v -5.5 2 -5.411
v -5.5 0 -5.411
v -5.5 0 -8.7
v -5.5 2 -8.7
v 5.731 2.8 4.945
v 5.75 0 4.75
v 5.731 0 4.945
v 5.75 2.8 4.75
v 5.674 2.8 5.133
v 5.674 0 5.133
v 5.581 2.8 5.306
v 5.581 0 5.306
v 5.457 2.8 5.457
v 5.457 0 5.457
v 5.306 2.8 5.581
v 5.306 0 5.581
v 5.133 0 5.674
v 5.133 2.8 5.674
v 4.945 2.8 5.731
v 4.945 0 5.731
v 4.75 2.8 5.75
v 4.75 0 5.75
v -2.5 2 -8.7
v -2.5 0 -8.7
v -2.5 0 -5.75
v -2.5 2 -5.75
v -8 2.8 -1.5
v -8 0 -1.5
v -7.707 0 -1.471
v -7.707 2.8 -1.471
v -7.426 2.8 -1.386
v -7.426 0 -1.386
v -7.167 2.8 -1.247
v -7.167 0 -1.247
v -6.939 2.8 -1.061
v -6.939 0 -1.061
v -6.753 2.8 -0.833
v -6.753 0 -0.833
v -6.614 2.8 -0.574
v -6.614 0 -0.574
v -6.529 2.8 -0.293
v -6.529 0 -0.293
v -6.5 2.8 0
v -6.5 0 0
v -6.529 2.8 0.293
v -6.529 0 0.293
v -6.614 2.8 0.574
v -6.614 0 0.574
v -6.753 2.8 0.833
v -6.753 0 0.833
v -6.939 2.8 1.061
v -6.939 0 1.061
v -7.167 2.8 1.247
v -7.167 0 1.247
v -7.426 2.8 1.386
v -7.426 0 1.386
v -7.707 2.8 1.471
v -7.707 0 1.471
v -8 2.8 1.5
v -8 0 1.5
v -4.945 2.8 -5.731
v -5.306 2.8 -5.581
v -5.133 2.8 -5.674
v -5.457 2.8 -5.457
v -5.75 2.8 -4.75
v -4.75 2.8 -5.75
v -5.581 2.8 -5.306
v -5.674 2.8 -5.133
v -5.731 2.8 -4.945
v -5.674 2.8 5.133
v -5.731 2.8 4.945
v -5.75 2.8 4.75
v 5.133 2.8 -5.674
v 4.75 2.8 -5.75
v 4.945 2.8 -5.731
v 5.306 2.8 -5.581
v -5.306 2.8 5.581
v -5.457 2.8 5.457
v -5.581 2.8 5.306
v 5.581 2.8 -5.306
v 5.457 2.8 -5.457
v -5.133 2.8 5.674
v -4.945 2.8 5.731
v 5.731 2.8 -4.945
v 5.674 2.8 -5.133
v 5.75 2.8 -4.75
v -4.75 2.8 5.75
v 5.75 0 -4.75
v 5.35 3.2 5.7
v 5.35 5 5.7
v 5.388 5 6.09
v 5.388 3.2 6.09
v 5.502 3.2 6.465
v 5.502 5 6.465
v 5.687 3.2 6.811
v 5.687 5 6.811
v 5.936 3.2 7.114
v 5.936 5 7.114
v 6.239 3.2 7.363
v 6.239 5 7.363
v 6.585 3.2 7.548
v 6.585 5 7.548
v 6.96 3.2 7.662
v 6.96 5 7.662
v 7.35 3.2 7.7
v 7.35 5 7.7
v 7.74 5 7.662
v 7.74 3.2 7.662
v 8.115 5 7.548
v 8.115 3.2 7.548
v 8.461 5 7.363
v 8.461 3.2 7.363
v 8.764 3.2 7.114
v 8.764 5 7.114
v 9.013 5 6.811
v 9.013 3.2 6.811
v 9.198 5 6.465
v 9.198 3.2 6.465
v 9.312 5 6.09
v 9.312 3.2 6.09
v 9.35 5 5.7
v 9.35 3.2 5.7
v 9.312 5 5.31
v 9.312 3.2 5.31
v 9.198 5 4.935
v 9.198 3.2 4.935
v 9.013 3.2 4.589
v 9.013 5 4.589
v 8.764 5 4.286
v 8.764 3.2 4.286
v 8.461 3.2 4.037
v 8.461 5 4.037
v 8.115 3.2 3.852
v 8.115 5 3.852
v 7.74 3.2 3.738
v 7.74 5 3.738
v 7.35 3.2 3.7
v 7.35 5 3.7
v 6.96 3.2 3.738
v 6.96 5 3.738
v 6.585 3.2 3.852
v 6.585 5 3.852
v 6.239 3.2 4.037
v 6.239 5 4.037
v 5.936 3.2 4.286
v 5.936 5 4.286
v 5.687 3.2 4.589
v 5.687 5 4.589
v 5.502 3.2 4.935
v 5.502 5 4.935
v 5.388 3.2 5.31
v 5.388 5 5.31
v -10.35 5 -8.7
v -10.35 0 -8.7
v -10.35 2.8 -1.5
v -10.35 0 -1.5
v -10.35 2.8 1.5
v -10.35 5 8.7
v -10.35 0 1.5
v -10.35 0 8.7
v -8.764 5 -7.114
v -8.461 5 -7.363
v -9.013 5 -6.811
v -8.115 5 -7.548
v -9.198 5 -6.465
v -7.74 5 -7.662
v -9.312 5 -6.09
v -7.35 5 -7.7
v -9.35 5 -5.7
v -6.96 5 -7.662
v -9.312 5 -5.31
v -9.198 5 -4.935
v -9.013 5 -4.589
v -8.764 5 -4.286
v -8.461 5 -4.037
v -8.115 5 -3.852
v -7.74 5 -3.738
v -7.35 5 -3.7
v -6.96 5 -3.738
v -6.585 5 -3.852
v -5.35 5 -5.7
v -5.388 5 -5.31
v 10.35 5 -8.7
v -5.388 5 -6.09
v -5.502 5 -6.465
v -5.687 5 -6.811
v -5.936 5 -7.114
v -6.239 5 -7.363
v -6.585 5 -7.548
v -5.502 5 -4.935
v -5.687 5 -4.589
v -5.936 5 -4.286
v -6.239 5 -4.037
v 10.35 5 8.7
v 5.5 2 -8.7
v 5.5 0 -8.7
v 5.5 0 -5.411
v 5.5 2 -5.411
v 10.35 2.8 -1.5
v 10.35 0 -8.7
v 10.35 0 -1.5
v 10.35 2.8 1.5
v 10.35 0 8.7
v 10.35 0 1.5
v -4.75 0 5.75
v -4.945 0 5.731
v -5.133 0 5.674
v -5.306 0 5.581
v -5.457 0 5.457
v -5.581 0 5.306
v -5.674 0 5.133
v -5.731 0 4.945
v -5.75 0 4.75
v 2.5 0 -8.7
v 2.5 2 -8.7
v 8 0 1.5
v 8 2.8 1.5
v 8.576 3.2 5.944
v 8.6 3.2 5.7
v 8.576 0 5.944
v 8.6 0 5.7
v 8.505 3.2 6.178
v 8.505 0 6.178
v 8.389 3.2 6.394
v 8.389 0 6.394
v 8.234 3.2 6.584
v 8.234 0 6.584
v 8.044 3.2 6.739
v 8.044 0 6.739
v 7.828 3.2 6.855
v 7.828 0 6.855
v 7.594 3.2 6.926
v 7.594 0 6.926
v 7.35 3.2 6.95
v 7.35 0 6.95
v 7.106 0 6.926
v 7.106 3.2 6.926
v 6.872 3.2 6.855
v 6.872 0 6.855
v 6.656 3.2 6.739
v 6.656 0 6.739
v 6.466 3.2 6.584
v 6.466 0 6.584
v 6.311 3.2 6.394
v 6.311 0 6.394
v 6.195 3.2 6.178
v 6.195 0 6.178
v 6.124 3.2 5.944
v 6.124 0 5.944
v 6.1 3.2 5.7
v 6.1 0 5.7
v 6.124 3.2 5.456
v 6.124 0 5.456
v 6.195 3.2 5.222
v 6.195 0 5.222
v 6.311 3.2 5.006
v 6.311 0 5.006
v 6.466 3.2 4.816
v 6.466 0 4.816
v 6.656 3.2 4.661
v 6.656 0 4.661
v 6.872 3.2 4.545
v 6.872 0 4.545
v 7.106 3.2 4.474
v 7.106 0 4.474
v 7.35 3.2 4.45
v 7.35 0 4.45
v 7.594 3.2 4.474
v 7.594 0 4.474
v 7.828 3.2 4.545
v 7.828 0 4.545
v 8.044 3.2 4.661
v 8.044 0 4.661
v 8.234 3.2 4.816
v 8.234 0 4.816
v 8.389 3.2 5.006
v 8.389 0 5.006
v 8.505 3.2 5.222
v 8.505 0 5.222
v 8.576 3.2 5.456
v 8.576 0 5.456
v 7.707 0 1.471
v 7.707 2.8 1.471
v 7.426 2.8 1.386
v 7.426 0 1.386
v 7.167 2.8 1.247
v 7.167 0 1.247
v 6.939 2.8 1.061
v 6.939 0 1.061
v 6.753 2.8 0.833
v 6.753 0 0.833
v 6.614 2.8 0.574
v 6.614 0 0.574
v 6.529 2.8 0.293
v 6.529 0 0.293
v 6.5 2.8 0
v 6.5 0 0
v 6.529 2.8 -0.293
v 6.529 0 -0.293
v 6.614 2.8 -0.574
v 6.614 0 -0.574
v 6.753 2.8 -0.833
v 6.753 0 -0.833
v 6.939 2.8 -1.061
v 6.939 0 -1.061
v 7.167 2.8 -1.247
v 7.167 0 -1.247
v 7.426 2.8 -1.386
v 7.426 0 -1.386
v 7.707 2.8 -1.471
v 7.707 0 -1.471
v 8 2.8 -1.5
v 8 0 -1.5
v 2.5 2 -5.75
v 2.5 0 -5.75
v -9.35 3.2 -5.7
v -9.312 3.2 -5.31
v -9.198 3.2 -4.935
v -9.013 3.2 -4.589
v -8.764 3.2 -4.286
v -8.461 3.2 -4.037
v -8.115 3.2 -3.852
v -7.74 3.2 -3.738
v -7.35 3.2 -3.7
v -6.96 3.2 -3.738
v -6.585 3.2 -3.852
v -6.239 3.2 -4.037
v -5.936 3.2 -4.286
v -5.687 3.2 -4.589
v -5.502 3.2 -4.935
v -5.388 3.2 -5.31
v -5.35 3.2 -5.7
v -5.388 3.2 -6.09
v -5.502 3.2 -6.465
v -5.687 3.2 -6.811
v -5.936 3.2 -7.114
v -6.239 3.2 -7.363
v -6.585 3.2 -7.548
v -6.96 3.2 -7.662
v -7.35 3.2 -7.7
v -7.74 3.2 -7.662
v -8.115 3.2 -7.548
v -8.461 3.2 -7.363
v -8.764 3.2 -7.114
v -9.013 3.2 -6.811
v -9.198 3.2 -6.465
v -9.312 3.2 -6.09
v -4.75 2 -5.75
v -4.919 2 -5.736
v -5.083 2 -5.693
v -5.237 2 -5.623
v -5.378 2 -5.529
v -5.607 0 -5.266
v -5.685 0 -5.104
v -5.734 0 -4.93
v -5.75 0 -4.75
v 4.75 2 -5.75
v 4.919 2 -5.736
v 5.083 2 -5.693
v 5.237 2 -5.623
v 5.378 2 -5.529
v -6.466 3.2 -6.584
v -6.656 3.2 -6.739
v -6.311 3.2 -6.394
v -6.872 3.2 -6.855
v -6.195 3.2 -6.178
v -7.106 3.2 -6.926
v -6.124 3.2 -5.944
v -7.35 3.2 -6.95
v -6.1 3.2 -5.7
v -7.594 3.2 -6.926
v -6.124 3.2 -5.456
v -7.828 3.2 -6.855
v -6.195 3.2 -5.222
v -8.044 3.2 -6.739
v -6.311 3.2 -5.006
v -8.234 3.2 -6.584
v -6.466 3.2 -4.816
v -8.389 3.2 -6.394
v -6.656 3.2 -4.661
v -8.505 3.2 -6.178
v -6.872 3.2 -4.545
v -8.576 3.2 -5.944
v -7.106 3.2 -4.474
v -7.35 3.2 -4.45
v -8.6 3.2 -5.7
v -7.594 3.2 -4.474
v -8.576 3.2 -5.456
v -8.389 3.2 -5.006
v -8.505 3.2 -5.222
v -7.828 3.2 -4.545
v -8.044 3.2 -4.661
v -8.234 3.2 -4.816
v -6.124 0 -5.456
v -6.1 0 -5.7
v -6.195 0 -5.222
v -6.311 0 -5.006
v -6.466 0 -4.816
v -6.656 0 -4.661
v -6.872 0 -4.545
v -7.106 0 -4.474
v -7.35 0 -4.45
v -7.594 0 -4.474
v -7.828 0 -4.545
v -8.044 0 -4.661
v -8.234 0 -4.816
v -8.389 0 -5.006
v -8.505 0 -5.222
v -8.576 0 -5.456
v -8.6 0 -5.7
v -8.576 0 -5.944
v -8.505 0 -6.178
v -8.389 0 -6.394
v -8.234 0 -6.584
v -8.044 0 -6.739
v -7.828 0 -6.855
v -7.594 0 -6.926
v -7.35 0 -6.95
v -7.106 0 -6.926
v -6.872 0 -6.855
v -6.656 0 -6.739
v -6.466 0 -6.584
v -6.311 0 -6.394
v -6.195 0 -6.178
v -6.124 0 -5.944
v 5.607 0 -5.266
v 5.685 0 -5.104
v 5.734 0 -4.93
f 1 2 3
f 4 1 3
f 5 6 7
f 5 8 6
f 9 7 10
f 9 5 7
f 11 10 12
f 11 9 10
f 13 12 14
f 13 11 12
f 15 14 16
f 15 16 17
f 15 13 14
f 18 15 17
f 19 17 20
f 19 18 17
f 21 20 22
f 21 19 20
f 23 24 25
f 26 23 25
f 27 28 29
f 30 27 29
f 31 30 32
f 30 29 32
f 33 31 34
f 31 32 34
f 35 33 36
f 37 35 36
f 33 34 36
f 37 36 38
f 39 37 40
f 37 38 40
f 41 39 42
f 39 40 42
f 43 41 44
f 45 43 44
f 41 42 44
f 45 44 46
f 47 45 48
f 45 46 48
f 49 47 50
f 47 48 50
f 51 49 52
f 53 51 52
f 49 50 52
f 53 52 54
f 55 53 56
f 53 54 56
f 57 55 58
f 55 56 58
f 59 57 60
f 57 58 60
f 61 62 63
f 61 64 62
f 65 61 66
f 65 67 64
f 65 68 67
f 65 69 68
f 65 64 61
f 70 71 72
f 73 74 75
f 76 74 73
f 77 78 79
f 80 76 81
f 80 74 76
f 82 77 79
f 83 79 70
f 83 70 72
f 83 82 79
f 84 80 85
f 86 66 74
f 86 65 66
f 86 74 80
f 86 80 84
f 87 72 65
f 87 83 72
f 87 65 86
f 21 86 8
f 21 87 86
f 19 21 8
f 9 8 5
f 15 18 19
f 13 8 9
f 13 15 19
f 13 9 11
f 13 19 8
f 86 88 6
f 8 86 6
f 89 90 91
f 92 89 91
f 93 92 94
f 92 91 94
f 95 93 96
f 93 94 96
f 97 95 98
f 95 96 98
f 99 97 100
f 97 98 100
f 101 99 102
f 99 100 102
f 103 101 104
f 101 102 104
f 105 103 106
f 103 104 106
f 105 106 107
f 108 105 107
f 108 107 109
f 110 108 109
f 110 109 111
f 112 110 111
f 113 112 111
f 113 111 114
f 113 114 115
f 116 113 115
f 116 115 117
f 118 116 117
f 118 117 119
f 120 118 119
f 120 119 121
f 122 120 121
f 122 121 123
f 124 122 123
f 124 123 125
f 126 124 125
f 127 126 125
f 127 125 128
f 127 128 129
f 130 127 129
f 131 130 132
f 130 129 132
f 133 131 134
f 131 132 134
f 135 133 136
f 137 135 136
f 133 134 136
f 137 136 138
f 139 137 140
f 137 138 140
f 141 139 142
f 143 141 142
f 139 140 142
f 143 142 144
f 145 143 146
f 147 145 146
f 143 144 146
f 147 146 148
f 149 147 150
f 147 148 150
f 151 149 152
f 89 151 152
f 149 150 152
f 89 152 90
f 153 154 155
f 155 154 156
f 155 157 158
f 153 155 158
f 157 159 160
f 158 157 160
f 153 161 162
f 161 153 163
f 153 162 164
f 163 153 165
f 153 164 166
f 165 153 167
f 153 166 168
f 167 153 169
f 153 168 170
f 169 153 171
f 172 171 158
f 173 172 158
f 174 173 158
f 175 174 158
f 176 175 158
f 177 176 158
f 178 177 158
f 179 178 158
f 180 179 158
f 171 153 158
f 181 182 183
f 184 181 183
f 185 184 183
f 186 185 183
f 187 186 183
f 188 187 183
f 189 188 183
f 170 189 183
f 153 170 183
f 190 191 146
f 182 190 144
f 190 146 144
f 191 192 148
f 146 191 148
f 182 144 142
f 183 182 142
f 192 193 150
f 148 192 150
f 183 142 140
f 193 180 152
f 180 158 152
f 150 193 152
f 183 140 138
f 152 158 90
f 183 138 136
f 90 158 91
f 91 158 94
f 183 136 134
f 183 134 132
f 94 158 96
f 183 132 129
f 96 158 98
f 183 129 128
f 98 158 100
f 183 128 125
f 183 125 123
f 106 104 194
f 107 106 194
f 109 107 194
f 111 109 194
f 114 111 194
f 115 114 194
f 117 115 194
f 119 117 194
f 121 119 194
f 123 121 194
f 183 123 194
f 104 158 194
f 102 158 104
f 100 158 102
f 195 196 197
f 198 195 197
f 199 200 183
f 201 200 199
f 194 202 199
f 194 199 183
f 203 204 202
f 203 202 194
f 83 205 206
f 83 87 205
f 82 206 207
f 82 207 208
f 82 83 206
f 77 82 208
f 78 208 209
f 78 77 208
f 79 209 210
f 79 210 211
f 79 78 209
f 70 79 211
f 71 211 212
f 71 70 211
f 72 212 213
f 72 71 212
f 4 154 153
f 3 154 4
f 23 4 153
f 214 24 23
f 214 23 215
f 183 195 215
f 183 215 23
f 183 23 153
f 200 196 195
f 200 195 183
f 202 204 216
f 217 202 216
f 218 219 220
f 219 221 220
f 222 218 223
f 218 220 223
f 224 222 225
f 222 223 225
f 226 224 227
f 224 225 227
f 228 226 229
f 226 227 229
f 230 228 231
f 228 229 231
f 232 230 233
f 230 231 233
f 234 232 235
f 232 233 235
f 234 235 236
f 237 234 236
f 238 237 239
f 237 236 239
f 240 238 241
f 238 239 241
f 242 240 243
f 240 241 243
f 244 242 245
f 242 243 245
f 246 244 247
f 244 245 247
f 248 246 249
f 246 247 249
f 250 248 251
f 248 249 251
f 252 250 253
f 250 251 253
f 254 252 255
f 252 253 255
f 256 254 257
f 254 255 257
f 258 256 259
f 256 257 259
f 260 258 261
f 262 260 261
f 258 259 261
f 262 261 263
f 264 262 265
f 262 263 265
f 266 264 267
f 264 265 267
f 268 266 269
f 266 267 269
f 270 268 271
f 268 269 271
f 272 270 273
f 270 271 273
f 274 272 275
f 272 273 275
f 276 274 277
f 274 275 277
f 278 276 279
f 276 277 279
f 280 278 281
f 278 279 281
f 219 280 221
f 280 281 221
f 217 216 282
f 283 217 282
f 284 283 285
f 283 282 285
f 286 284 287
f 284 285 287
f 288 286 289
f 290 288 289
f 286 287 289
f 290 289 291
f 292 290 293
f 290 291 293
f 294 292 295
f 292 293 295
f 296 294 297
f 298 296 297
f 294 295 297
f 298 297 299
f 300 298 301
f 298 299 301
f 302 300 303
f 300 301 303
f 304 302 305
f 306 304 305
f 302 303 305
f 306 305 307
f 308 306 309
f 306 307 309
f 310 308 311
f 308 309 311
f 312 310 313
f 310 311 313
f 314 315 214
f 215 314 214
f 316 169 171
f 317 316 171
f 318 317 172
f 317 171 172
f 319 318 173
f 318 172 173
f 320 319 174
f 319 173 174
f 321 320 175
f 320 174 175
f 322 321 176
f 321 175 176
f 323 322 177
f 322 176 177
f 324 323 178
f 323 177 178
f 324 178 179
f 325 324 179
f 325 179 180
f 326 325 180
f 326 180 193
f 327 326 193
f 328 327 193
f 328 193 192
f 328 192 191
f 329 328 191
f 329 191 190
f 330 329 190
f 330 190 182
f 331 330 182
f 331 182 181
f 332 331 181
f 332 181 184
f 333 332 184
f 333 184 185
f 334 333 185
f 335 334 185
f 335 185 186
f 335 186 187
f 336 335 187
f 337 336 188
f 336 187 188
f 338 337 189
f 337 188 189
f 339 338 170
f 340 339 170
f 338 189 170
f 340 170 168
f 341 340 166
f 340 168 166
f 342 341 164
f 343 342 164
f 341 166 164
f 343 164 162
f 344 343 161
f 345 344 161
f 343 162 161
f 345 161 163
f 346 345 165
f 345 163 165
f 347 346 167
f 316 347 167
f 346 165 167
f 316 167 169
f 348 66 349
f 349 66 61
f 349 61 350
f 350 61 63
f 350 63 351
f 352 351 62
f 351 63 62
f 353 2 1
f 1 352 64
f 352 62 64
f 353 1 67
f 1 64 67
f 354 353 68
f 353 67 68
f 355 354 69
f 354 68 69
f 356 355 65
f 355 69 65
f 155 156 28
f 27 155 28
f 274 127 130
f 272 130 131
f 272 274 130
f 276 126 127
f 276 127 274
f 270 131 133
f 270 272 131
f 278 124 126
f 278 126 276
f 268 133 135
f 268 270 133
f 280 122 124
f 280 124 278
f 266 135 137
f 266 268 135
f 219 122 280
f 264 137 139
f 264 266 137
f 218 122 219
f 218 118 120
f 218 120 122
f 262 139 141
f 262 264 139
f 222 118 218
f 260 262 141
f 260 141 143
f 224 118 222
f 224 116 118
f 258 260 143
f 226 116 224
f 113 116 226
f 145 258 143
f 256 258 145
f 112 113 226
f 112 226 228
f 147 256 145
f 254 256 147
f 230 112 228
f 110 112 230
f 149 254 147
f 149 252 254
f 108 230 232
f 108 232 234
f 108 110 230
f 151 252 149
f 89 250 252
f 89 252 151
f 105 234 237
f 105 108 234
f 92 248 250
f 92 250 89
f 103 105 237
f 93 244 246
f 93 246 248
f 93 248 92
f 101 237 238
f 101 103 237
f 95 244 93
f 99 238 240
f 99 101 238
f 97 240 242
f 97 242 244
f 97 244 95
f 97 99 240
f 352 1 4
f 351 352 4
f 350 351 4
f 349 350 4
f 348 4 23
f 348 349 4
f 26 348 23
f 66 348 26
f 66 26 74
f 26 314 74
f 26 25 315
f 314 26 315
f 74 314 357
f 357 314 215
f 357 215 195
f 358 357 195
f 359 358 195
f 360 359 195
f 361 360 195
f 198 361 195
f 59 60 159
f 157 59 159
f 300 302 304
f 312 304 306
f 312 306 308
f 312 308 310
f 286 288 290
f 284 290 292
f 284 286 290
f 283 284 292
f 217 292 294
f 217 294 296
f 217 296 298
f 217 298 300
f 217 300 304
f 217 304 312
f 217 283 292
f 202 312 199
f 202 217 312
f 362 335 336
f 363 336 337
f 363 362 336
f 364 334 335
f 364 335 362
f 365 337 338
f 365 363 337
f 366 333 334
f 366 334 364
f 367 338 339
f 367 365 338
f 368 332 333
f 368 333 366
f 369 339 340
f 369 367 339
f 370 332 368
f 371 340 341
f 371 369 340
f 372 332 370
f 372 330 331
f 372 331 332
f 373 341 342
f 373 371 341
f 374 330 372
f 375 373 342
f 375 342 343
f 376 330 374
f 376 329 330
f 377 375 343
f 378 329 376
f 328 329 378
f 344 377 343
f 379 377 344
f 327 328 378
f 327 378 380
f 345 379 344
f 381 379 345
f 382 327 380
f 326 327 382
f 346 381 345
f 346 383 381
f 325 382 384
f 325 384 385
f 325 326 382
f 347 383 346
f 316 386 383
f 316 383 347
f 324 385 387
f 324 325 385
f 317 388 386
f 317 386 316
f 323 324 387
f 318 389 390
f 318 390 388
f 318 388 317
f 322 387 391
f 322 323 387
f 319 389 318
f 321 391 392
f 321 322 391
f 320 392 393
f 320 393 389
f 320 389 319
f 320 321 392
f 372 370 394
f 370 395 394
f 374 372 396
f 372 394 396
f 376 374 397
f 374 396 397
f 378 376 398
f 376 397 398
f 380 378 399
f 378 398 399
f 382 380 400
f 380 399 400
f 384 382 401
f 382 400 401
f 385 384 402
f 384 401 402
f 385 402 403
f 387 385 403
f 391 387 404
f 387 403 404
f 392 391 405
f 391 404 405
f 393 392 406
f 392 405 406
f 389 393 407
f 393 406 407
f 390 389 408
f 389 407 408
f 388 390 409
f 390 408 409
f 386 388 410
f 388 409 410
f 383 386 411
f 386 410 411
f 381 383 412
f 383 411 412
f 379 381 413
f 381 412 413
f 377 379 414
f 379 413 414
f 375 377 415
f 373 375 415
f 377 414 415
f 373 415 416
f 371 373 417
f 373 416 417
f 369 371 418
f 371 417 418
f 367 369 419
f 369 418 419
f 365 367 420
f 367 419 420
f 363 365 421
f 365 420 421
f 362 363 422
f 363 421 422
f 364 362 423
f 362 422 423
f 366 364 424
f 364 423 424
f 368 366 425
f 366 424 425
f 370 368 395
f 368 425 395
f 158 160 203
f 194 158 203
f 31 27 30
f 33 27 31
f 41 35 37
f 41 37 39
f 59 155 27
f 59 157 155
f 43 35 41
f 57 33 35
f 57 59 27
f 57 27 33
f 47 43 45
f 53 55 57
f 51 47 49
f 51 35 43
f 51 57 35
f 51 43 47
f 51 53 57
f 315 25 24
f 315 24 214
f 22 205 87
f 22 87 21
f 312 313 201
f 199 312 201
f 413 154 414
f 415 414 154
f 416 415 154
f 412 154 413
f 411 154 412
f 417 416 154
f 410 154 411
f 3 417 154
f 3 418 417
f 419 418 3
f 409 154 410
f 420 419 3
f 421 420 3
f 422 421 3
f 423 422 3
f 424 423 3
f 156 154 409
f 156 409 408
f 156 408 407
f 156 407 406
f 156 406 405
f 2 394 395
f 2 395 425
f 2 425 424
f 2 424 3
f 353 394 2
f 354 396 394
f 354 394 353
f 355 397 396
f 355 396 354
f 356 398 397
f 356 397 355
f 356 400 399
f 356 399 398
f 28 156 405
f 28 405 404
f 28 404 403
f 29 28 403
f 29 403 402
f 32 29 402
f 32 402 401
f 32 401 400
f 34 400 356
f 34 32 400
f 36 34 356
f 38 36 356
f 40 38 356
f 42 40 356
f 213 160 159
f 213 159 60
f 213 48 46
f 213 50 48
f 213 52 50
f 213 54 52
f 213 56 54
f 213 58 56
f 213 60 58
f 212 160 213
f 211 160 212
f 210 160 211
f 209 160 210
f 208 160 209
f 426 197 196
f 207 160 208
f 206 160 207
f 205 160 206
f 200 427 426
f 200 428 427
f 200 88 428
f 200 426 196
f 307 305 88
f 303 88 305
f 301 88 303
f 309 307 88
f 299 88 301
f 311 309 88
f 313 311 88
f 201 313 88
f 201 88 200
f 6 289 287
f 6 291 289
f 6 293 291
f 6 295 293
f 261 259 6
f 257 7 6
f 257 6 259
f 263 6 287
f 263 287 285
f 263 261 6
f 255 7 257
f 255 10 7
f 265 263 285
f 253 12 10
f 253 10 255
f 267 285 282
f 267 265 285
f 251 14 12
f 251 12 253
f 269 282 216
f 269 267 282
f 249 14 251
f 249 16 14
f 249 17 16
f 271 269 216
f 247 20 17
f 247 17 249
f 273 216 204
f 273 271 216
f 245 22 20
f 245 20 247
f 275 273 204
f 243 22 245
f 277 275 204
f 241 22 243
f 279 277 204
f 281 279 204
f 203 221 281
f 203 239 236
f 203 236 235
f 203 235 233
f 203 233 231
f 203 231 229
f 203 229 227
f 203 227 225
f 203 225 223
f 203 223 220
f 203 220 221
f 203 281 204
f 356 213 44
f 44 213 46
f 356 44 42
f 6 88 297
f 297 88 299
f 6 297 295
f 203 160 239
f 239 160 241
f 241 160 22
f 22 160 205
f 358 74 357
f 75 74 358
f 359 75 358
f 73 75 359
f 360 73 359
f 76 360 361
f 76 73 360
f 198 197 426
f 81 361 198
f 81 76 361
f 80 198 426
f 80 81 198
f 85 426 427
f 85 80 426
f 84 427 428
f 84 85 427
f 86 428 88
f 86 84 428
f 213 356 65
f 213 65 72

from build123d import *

# Parameters (mm, degrees)
F0_W           = 20.7
F0_H           = 17.4
F1_DEPTH       = 5
F2_W           = 11.5
F2_H           = 11.5
F3_DEPTH       = 2.8
F5_R           = 1
F7_DEPTH       = 2.8
F9_D           = 2.5
F9_DEPTH       = 5
F9_CBORE_D     = 4
F9_CBORE_DEPTH = 1.8
F9_TIP         = 0.7510757738
F11_DEPTH      = 2


# Not quite as in the source:
# - a feature names something its author has since deleted; it is built from what else it names


with BuildPart() as f1:
    # F0 (on Front) → F1 (new body)
    with BuildSketch(Plane.XZ):
        Rectangle(F0_W, F0_H)
    extrude(amount=-F1_DEPTH)

    # F2 (on face) → F3 (cut)
    with BuildSketch(Plane.XZ):
        Rectangle(F2_W, F2_H)
    extrude(amount=-F3_DEPTH, mode=Mode.SUBTRACT)

    # F5
    f5_edges = [f1.edges().sort_by_distance(p)[0] for p in [
        (-5.75, 1.4, 5.75),
        (5.75, 1.4, 5.75),
        (-5.75, 1.4, -5.75),
        (5.75, 1.4, -5.75),
    ]]
    fillet(f5_edges, radius=F5_R)

    # F6 (on face) → F7 (cut)
    with BuildSketch(Plane.XZ):
        with BuildLine():
            Line((-10.35, -1.5), (-8, -1.5))
            ThreePointArc((-8, -1.5), (-6.5, 0), (-8, 1.5))
            Line((-8, 1.5), (-10.35, 1.5))
            Line((-10.35, 1.5), (-10.35, -1.5))
        make_face()
        with BuildLine():
            ThreePointArc((8, 1.5), (6.5, 0), (8, -1.5))
            Line((8, -1.5), (8, 0))
            Line((8, 0), (8, 1.5))
        make_face()
        Polygon((8, -1.5), (10.35, -1.5), (10.35, 1.5), (8, 1.5), (8, 0), align=None)
    extrude(amount=-F7_DEPTH, mode=Mode.SUBTRACT)

    # F9
    with Locations(Plane(origin=(0, 5, 0), x_dir=(-1, 0, 0), z_dir=(0, 1, 0))):
        with Locations((7.35, -5.7), (-7.35, 5.7)):
            CounterBoreHole(F9_D / 2, F9_CBORE_D / 2, F9_CBORE_DEPTH, depth=F9_DEPTH)
            with Locations((0, 0, -(F9_DEPTH + F9_TIP / 2))):  # 118° drill point
                Cone(0, F9_D / 2, F9_TIP, mode=Mode.SUBTRACT)

    # F10 (on face) → F11 (cut)
    with BuildSketch(Plane.XZ):
        with BuildLine():
            Line((4.75, -5.75), (2.5, -5.75))
            Line((2.5, -5.75), (2.5, -8.7))
            Line((2.5, -8.7), (5.5, -8.7))
            Line((5.5, -8.7), (5.5, -5.4114378278))
            ThreePointArc((5.5, -5.4114378278), (5.1614378278, -5.6614378278), (4.75, -5.75))
        make_face()
        with BuildLine():
            Line((-2.5, -5.75), (-4.75, -5.75))
            ThreePointArc((-4.75, -5.75), (-5.1614378278, -5.6614378278), (-5.5, -5.4114378278))
            Line((-5.5, -5.4114378278), (-5.5, -8.7))
            Line((-5.5, -8.7), (-2.5, -8.7))
            Line((-2.5, -8.7), (-2.5, -5.75))
        make_face()
    extrude(amount=-F11_DEPTH, mode=Mode.SUBTRACT)


solid = f1.part
